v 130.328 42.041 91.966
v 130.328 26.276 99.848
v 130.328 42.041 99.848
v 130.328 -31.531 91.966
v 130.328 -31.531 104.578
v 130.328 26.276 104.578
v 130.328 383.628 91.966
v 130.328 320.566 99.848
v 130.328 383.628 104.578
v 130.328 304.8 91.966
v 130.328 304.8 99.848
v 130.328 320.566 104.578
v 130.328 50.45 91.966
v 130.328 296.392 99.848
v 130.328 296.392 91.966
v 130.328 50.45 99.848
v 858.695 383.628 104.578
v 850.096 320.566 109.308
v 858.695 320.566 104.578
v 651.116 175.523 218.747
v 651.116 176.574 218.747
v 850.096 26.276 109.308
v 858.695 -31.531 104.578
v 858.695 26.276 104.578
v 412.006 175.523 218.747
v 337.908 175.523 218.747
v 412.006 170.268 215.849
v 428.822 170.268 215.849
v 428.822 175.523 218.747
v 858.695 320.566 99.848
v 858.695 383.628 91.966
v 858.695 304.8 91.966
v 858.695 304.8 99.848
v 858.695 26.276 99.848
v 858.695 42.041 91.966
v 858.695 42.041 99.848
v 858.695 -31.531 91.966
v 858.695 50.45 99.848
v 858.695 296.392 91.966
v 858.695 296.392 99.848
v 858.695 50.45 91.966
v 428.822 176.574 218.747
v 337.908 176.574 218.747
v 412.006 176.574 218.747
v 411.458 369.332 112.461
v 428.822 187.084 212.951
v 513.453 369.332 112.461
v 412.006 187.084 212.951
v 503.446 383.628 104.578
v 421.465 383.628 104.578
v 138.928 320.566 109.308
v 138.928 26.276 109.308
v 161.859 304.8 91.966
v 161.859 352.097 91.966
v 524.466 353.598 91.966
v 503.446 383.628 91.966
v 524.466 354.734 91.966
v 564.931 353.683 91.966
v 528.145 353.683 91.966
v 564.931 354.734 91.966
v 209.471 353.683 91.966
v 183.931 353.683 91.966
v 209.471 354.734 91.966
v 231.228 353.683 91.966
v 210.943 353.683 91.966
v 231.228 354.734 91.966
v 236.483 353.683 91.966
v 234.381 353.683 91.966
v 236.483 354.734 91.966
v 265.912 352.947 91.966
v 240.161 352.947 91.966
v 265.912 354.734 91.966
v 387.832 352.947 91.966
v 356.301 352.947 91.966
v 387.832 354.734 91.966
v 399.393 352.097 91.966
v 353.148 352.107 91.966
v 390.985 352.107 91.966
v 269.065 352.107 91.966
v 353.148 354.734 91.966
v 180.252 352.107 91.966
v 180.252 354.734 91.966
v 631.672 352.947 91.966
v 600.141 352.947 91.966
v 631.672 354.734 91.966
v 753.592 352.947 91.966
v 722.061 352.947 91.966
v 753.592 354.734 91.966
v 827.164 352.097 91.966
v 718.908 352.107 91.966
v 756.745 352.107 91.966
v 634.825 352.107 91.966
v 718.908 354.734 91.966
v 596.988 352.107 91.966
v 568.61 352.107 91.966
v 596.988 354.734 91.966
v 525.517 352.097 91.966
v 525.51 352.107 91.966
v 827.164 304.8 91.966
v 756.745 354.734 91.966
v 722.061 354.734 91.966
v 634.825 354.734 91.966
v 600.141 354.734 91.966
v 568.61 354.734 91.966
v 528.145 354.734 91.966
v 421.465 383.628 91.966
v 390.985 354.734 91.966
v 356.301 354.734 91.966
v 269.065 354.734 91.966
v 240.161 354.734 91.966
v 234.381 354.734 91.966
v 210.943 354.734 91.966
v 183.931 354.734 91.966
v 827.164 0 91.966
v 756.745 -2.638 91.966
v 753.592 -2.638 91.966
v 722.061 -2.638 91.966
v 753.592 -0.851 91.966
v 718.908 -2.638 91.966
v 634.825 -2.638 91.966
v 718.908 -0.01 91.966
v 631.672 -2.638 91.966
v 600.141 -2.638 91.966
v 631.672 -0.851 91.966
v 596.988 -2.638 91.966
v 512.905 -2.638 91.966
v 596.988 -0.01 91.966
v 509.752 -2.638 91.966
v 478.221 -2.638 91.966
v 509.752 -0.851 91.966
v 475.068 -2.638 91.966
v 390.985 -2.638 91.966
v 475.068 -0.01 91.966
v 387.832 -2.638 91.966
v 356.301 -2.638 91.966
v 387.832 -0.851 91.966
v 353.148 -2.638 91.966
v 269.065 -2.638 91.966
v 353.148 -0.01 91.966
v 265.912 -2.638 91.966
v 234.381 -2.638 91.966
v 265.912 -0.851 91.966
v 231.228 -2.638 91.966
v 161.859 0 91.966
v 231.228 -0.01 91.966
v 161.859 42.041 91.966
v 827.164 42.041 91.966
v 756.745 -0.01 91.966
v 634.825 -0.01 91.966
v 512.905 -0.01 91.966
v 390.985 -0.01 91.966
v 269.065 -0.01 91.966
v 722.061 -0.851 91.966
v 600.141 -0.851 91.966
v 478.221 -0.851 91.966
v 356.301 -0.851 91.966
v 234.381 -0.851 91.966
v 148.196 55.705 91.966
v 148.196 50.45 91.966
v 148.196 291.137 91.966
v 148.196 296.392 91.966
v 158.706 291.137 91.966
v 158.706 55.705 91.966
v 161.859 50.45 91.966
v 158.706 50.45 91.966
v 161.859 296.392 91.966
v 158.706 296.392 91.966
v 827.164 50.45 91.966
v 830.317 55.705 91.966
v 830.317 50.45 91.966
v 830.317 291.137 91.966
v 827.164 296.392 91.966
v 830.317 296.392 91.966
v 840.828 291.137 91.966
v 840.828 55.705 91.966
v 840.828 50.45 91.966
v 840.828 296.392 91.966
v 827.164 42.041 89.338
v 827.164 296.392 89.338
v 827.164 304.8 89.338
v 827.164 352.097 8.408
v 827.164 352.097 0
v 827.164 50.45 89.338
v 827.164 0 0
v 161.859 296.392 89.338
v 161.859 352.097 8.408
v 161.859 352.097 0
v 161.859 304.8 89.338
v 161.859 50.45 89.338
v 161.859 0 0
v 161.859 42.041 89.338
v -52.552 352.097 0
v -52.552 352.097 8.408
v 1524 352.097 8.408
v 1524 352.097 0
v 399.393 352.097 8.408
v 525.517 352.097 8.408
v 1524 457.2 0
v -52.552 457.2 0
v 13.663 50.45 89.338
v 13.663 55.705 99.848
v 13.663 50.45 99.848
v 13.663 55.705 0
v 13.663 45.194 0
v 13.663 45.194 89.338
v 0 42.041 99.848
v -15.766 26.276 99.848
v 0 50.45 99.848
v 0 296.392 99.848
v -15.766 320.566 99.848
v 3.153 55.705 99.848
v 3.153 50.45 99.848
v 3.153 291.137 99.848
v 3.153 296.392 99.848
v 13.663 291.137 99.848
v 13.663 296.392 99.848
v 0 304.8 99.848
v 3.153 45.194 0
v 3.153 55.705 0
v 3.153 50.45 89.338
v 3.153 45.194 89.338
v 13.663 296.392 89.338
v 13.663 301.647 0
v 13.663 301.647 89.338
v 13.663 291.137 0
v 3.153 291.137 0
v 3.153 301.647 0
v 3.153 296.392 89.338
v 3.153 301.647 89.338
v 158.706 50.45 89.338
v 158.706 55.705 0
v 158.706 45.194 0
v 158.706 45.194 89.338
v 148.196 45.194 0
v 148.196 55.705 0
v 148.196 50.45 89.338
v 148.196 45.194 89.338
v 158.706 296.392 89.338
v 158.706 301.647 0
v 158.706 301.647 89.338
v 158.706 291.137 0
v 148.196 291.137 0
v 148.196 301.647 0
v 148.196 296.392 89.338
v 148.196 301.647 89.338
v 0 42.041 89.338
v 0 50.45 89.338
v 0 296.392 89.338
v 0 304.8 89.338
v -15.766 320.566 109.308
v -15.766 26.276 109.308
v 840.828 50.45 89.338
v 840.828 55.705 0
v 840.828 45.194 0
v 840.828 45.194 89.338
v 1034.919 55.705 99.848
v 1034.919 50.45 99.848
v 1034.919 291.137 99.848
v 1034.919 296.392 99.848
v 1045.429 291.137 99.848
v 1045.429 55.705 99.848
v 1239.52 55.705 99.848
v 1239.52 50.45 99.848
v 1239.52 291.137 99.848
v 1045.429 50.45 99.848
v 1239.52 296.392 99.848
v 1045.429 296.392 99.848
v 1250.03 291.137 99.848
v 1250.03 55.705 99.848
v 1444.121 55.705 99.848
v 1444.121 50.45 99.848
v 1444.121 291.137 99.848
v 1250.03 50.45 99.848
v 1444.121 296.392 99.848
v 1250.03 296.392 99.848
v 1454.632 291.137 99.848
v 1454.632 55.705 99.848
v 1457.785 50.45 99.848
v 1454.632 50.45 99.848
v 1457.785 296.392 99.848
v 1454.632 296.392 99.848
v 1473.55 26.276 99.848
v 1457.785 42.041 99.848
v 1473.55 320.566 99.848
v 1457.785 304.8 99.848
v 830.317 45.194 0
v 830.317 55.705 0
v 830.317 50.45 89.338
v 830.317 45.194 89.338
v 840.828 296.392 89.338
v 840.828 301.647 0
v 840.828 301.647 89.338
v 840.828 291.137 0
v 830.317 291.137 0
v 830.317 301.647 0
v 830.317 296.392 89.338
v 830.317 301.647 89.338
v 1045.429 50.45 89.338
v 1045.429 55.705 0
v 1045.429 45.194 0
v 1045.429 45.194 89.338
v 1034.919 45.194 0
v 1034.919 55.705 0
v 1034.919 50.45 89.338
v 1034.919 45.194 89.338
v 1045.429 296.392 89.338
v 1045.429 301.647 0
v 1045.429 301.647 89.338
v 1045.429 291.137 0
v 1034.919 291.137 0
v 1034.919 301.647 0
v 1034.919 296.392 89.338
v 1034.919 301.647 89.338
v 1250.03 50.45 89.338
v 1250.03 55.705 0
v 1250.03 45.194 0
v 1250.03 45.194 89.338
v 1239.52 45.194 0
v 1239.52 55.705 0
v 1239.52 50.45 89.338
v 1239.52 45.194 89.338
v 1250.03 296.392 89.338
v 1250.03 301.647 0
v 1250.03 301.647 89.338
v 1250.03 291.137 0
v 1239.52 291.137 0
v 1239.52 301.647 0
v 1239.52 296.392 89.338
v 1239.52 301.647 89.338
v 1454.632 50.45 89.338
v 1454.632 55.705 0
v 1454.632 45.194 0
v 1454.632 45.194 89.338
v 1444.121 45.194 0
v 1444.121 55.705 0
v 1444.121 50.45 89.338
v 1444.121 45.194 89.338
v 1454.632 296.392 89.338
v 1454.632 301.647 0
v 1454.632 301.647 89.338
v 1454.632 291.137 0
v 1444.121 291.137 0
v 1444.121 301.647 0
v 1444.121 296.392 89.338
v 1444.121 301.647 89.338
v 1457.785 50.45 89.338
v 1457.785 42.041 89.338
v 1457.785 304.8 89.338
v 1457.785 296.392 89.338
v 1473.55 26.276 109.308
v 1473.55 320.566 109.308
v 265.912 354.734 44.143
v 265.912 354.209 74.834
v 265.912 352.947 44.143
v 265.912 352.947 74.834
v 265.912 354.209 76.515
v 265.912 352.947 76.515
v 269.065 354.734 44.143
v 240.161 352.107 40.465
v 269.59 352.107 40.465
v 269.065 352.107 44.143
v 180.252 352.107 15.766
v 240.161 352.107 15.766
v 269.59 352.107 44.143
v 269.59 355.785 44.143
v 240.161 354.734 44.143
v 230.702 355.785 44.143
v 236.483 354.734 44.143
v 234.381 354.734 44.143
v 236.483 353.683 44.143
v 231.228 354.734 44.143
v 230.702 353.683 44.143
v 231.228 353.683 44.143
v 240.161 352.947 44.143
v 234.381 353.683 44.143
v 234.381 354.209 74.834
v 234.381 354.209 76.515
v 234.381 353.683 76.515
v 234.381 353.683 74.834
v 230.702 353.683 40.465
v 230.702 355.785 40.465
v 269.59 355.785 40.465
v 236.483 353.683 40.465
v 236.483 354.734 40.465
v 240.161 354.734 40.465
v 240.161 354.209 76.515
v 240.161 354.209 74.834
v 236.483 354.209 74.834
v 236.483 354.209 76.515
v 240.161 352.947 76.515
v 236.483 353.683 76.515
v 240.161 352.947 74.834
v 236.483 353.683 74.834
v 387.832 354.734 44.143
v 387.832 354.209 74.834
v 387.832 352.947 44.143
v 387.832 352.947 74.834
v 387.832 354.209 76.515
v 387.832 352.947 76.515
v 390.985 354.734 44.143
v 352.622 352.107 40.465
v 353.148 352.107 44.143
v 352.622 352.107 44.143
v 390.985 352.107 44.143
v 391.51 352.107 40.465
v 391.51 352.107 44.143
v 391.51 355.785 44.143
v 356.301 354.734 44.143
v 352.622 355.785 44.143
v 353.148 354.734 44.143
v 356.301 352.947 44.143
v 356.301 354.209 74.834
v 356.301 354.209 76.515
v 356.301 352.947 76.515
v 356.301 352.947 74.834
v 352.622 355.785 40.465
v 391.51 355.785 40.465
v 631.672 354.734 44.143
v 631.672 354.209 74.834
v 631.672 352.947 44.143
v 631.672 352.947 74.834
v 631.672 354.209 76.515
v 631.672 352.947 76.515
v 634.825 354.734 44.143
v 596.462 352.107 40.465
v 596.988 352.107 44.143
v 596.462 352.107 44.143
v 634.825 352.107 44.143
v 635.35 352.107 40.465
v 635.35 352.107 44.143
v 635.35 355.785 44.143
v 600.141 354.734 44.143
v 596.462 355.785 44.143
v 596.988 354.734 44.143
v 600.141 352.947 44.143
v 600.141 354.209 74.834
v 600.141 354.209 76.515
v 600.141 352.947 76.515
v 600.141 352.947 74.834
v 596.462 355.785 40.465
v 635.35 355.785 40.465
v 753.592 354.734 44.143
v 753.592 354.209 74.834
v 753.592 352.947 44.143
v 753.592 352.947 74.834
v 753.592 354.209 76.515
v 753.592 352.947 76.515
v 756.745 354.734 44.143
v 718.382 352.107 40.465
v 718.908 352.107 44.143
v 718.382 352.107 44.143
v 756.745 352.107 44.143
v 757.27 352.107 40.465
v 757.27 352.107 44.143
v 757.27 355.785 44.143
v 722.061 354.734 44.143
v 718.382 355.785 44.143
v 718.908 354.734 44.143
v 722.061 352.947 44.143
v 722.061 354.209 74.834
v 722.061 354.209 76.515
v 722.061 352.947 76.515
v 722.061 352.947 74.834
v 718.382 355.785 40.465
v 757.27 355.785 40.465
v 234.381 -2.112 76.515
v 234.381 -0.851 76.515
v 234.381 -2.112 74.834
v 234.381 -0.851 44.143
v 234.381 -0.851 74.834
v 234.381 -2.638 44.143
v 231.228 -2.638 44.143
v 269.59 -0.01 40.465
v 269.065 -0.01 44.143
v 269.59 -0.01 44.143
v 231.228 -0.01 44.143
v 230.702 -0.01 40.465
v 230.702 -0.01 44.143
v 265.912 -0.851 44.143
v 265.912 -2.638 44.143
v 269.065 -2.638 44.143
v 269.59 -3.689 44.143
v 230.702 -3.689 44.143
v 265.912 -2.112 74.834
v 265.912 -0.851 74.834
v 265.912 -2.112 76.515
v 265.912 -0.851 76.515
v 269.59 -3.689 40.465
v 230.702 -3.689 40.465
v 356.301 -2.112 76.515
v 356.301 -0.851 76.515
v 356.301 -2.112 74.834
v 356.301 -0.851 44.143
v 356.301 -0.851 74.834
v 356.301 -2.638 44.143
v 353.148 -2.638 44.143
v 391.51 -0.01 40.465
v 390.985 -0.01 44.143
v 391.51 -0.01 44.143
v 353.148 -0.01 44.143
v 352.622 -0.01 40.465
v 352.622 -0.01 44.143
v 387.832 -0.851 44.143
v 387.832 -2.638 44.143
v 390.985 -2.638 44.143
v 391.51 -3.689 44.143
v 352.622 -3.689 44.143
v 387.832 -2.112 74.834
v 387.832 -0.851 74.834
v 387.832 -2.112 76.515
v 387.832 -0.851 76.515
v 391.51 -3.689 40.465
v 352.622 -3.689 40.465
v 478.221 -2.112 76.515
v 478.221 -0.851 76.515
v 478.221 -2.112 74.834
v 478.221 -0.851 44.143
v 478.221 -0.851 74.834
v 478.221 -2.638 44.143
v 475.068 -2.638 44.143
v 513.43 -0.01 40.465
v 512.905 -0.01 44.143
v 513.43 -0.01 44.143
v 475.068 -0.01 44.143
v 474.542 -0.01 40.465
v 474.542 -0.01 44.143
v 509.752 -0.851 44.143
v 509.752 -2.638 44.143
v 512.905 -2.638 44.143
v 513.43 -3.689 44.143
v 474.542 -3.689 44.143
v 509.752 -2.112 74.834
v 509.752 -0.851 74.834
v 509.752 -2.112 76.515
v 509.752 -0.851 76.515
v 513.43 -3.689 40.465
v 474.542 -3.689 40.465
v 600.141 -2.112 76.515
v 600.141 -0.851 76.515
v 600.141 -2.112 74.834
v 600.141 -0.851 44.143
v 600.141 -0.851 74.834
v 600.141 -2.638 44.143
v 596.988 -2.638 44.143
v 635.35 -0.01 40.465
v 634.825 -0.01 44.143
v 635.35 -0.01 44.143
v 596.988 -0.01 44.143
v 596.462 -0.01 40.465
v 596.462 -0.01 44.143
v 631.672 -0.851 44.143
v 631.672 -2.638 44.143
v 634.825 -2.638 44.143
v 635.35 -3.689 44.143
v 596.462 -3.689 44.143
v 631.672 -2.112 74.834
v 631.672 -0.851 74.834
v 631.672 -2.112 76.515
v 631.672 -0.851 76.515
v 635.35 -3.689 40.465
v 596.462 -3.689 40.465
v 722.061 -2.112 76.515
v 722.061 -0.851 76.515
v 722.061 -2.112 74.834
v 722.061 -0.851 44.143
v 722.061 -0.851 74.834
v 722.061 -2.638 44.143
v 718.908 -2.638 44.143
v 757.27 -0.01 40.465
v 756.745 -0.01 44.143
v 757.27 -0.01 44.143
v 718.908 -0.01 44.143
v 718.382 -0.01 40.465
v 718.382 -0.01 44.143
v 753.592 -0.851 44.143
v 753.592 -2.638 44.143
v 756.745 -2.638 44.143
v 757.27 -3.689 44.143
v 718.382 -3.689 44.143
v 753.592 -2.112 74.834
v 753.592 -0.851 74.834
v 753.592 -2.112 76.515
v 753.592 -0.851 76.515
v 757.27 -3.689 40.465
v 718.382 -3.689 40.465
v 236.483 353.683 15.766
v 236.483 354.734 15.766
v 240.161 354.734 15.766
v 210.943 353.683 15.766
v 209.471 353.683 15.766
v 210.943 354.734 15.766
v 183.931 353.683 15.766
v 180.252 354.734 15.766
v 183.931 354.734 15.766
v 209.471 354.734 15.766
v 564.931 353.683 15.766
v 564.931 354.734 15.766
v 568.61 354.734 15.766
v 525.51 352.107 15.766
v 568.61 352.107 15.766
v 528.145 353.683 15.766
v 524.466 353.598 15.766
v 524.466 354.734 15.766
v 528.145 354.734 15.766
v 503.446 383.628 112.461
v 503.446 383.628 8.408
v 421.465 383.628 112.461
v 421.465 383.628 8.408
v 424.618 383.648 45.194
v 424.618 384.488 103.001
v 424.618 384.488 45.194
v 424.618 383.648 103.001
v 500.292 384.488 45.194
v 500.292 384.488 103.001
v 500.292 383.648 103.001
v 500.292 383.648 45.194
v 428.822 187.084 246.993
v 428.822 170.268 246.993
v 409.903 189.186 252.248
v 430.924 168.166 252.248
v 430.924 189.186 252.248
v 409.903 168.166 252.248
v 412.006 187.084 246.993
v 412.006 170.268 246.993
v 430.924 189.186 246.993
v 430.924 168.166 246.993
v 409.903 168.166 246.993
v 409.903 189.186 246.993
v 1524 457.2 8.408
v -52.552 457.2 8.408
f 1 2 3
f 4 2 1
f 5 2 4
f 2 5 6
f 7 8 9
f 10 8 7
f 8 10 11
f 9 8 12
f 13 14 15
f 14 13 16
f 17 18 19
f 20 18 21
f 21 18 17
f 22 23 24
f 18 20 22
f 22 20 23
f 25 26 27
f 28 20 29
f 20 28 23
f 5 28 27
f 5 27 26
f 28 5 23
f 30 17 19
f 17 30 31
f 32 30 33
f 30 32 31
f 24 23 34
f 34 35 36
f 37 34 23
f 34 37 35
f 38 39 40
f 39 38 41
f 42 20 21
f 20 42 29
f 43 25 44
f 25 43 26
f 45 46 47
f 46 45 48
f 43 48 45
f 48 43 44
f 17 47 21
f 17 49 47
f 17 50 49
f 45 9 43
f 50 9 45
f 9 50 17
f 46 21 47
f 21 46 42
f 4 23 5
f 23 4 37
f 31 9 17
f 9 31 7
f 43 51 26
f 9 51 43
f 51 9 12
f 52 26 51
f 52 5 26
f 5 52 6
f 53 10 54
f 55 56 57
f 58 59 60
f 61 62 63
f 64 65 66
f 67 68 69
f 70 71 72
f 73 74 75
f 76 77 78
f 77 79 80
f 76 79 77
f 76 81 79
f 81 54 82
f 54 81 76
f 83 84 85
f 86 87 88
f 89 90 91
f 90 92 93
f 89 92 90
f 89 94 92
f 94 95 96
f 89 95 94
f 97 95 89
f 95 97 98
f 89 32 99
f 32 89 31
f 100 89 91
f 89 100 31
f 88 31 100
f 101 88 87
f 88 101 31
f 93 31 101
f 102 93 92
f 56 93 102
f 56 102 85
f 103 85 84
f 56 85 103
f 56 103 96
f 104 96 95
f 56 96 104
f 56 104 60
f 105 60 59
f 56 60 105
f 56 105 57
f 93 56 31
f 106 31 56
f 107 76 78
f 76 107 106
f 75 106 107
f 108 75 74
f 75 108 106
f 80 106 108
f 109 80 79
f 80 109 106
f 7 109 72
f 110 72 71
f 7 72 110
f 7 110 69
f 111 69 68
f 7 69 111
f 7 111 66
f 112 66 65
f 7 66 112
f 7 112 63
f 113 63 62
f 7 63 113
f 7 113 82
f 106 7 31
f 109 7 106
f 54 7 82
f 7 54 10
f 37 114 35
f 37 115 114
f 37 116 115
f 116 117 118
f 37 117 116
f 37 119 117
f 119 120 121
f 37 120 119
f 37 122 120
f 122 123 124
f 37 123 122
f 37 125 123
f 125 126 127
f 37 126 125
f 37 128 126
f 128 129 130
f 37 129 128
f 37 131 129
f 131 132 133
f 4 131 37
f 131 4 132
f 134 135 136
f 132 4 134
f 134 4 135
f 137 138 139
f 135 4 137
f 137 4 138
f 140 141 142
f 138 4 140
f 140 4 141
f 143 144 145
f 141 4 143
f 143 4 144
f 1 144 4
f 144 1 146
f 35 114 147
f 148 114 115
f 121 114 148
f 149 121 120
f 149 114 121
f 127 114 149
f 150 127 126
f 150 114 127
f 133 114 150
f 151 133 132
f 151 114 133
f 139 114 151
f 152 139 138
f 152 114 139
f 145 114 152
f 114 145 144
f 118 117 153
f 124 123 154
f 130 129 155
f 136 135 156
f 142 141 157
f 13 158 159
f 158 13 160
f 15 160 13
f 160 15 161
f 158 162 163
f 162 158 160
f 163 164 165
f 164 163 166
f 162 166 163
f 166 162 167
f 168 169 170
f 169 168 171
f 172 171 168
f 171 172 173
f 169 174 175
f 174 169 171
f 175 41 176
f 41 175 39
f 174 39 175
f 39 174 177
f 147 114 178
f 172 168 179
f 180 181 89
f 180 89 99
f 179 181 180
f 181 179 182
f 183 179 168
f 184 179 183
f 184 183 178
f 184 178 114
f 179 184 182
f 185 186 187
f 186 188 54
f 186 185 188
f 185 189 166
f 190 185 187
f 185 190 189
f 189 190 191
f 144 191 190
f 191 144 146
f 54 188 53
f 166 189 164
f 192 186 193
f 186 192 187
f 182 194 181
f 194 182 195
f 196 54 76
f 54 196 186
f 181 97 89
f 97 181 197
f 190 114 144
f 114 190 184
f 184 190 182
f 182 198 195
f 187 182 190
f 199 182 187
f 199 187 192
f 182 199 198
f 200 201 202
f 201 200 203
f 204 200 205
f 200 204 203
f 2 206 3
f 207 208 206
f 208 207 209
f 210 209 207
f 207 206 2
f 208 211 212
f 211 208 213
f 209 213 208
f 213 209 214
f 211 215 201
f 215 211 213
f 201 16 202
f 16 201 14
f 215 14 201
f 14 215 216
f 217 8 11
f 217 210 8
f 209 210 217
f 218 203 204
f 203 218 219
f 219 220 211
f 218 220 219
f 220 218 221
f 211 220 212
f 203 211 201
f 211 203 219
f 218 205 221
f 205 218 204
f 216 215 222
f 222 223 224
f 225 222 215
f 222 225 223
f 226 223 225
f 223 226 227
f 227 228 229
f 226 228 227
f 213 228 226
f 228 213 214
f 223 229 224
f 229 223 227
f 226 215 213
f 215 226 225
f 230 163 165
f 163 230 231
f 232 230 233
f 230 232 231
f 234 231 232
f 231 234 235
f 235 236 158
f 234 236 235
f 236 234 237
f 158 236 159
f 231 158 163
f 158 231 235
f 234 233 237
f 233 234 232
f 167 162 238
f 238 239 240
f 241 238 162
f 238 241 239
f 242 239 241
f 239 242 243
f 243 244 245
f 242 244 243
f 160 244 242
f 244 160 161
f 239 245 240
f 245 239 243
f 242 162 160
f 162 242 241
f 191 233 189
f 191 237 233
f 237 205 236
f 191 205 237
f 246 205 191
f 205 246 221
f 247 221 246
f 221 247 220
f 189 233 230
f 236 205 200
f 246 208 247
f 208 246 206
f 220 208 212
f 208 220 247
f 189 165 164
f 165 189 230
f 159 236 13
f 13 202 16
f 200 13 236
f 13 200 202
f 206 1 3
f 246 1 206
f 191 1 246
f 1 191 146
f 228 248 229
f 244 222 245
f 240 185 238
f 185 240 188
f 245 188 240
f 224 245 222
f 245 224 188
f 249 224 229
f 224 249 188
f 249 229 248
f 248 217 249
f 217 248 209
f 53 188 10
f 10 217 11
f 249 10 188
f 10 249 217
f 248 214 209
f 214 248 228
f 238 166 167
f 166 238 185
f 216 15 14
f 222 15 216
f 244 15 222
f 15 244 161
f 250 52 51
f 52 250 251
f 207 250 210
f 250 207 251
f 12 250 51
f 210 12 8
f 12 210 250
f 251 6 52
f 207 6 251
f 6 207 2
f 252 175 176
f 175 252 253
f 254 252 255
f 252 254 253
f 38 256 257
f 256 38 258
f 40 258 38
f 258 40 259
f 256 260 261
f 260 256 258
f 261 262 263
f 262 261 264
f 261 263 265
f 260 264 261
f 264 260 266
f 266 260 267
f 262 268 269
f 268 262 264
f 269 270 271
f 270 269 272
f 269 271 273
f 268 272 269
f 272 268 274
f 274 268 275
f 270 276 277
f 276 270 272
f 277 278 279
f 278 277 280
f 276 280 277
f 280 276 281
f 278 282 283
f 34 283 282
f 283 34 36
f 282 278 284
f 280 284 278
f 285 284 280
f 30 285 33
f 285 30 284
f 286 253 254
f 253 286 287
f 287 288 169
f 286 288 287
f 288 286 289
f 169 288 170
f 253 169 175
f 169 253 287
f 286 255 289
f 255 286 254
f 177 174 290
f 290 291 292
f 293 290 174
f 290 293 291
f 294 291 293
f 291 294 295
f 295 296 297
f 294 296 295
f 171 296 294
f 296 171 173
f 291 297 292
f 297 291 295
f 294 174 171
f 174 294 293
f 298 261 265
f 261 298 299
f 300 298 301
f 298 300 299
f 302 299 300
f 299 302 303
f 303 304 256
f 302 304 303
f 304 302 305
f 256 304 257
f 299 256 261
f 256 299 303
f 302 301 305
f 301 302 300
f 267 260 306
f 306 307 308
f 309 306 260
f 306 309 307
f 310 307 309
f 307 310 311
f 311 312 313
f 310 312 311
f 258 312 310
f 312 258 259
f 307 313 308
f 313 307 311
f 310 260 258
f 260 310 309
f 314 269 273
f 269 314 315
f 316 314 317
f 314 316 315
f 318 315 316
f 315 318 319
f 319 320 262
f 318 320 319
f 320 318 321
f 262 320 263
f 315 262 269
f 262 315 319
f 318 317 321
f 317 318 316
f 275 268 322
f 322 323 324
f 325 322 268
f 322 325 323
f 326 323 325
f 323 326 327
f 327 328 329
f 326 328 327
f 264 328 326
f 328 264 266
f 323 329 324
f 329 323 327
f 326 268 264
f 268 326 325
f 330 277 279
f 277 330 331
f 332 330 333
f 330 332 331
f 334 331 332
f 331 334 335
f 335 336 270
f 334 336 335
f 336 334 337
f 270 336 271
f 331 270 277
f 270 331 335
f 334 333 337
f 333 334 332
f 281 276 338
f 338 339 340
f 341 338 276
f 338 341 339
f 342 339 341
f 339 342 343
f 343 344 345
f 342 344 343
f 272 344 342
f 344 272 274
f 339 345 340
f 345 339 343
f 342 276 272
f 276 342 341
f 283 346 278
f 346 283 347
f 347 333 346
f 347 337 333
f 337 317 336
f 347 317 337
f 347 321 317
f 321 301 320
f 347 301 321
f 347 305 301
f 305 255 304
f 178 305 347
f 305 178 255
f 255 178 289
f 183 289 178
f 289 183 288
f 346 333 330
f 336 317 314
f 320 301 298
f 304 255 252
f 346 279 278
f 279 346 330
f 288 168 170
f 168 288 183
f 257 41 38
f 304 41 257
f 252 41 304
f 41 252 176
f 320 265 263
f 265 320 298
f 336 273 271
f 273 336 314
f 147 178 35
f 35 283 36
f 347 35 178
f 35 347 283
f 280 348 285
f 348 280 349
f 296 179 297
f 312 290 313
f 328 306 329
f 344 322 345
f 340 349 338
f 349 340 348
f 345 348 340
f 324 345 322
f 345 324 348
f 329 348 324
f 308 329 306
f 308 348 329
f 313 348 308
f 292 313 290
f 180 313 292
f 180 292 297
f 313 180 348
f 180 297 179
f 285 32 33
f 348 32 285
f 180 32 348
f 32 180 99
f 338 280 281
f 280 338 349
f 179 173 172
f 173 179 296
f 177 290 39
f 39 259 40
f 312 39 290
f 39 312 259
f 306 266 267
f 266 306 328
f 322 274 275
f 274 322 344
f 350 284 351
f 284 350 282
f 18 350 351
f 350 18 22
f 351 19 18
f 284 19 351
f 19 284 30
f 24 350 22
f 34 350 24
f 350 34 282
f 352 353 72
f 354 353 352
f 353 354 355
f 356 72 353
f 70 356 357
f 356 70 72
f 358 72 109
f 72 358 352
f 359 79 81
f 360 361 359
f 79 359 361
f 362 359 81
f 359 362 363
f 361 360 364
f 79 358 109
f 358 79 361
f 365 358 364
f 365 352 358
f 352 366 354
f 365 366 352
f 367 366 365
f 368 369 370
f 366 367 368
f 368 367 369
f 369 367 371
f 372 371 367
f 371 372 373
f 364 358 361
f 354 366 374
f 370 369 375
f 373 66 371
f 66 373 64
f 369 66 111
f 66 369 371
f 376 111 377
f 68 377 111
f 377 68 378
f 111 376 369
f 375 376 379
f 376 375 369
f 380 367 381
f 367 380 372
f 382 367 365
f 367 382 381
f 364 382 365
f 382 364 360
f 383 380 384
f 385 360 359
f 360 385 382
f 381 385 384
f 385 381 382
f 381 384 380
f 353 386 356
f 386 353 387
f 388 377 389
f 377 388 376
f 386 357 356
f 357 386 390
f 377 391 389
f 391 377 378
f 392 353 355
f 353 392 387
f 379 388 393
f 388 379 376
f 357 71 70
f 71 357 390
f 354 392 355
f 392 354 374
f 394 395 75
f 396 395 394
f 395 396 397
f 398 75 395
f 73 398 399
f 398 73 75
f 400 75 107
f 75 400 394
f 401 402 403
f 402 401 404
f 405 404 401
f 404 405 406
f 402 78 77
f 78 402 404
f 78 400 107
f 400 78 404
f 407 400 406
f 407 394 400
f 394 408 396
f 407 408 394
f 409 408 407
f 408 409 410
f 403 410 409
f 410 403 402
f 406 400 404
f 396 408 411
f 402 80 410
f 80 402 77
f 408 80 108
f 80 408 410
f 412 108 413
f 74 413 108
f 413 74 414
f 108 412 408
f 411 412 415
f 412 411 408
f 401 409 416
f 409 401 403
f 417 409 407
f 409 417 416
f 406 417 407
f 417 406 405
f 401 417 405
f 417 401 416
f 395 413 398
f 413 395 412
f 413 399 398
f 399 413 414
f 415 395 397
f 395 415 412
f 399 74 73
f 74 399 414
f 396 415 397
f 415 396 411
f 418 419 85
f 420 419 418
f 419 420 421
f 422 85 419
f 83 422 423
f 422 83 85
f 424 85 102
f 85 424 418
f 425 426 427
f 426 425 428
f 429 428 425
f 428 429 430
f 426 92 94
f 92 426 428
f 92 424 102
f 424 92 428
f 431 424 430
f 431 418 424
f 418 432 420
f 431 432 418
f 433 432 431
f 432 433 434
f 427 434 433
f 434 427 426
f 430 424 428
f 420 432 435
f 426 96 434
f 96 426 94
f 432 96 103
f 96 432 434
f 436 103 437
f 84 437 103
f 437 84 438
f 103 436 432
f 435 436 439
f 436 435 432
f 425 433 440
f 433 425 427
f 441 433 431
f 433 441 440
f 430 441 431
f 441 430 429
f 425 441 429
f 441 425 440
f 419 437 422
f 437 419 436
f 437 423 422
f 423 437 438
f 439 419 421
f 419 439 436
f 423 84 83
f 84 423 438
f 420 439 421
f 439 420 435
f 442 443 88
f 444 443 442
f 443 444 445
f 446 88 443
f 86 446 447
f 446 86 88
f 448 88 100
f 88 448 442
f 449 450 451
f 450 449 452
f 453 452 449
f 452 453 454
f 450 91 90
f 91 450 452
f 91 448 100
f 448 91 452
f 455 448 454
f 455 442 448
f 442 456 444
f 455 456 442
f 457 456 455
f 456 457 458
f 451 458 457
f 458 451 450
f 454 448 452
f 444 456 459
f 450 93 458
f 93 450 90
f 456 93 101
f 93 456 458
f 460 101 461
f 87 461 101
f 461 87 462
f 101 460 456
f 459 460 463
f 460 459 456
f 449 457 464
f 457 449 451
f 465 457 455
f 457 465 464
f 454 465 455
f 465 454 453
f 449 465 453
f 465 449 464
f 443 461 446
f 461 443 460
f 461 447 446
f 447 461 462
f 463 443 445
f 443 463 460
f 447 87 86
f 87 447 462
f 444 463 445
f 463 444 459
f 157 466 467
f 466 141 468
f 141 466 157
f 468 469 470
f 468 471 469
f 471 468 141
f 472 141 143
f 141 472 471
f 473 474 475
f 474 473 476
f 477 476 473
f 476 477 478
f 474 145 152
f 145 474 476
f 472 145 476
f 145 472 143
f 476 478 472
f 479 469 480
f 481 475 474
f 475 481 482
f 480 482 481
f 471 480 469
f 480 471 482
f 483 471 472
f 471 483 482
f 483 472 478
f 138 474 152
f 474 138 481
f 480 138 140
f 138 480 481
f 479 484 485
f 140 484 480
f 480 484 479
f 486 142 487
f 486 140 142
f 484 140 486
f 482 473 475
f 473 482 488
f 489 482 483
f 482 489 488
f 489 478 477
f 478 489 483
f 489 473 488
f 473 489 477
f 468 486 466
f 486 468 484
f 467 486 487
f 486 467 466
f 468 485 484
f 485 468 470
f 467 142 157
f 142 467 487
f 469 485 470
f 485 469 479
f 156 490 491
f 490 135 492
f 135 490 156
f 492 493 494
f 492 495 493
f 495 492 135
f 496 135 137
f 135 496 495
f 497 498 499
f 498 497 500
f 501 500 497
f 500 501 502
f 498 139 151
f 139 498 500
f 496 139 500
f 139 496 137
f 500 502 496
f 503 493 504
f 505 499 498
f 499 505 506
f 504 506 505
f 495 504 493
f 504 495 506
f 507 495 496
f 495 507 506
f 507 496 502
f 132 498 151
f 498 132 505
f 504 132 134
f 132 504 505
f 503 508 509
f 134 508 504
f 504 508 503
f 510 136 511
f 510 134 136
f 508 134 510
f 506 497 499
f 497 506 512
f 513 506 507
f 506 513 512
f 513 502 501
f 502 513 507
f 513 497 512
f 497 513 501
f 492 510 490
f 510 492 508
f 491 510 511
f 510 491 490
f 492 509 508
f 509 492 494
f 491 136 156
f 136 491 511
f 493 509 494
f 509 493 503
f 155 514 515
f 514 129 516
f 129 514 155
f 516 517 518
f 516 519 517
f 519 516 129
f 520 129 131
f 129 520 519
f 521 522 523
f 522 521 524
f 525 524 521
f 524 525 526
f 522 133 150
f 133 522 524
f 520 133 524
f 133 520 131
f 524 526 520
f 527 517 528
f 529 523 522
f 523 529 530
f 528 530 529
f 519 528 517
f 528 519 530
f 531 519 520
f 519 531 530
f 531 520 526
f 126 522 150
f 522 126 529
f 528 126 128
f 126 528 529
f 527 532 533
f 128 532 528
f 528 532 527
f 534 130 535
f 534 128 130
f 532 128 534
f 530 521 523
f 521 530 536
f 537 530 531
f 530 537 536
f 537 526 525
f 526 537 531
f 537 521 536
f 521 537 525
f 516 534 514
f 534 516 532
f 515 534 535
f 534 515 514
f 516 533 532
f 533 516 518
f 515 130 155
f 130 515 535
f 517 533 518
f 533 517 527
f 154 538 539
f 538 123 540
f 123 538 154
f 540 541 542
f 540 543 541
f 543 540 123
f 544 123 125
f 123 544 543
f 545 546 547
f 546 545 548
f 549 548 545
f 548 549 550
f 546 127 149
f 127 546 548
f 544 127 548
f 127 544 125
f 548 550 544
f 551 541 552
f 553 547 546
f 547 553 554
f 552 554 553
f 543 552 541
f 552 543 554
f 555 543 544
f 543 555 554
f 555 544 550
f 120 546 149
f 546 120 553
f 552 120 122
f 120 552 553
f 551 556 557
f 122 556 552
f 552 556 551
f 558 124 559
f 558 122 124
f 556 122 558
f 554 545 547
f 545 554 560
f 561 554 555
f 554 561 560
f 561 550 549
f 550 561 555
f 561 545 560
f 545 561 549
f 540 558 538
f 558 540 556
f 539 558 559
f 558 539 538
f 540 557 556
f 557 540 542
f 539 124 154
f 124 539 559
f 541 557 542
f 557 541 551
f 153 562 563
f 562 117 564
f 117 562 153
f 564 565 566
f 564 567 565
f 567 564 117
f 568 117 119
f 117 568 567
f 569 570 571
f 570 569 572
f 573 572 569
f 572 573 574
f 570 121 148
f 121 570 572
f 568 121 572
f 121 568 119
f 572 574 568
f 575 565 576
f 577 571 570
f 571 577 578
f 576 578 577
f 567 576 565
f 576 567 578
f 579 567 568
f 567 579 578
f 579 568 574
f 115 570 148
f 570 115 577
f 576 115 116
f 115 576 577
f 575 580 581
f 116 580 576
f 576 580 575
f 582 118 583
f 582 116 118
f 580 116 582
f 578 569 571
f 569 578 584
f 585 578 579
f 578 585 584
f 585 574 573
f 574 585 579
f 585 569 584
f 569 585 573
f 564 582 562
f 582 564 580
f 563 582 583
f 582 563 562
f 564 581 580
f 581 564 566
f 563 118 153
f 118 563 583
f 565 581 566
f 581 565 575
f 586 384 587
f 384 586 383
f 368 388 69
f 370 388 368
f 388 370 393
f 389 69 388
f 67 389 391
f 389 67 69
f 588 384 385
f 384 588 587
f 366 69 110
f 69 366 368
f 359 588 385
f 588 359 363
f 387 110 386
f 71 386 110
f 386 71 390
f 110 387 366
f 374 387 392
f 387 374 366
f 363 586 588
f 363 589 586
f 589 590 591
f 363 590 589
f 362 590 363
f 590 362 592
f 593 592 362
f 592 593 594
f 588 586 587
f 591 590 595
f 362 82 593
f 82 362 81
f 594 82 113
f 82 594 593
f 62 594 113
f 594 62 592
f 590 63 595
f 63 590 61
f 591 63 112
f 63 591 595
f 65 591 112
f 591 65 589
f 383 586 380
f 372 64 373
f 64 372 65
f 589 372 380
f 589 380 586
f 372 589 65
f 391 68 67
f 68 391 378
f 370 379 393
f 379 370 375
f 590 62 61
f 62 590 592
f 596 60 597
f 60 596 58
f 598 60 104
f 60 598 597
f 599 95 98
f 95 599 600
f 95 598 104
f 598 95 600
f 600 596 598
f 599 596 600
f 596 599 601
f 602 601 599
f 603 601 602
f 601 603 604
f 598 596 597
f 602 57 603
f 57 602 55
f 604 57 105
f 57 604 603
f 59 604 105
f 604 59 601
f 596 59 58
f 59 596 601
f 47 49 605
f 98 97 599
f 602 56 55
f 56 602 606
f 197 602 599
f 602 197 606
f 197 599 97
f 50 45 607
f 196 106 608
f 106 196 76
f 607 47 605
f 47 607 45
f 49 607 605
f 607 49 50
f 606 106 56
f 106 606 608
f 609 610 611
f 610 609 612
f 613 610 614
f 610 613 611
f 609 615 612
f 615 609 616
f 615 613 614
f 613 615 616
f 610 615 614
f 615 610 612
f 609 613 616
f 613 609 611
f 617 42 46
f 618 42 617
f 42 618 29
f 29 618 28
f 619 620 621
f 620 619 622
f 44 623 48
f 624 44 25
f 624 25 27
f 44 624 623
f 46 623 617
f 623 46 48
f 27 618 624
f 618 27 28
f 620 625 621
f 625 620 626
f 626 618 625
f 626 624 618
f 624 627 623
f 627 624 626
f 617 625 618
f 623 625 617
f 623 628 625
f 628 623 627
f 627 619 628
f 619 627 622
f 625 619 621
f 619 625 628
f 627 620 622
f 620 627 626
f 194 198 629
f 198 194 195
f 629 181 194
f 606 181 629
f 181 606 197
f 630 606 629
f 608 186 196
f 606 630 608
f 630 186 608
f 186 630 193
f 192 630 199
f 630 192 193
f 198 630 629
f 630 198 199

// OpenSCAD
// =====================================================================
//  MILWAUKEE ROAD - HARTLAND, WIS. PASSENGER STATION
//  Source: Album sheet 111, built 1917 (drawn Aug 26 1919).  Drawings are private reference (in copyright):
//  Research Library / RSW / Stations / Standard depots / Album of Depot Plans 1919.
//  Rib Side Works, 24 Nov 2026. FIRST SHAPE MODEL for review - not cut into print sections.
//  KNOWN (from the sheet): 63 ft 4 in station + pavilions (15 ft 4 in and 60 ft, tar and gravel roofs); baggage 19 x 27, smoking 16 ft 6 x 27, ticket office 15 ft 8 x 17 ft 10, general waiting 24 ft 10 x 37 ft 4; stucco, red asphalt shingles, half-timbered gable.
//  ESTIMATE: wall and ridge heights where not written, window count and spacing, colours.
//  Built with the shared depot builder ../../../_common/rsw_depot.scad (x along the track,
//  y = 0 town side, track side +y, feet).  SCALE: 29 = G, 48 = O, 87 = HO.
// =====================================================================
SCALE = 29;
include <../../../_common/rsw_depot.scad>

depot(blocks = [[15.4, 63.3, 0, 33.5, 11, 0.55, 0, 3, 1]],
      pavs   = [[0, 15.4, 4, 25, 9.5, 0.1, 4, 1.5, 2, 2], [78.7, 60, 4, 25, 9.5, 0.1, 4, 1.5, 4, 2]],
      wins   = [[23.8, 1, 3, 6, 4.2], [35.4, 1, 3, 6, 4.2], [47.0, 1, 3, 6, 4.2], [58.6, 1, 3, 6, 4.2], [70.2, 1, 3, 6, 4.2], [23.8, 0, 3, 6, 4.2], [35.4, 0, 3, 6, 4.2], [47.0, 0, 3, 6, 4.2], [58.6, 0, 3, 6, 4.2], [70.2, 0, 3, 6, 4.2]],
      doors  = [[20, 1, 5, 8, 1], [52, 1, 3.5, 7.5, 0]],
      bays   = [[44, 1, 12, 3]],
      chims  = [[40, 17, 24]],
      plat   = [-5, 150, 10, 0.8]);
